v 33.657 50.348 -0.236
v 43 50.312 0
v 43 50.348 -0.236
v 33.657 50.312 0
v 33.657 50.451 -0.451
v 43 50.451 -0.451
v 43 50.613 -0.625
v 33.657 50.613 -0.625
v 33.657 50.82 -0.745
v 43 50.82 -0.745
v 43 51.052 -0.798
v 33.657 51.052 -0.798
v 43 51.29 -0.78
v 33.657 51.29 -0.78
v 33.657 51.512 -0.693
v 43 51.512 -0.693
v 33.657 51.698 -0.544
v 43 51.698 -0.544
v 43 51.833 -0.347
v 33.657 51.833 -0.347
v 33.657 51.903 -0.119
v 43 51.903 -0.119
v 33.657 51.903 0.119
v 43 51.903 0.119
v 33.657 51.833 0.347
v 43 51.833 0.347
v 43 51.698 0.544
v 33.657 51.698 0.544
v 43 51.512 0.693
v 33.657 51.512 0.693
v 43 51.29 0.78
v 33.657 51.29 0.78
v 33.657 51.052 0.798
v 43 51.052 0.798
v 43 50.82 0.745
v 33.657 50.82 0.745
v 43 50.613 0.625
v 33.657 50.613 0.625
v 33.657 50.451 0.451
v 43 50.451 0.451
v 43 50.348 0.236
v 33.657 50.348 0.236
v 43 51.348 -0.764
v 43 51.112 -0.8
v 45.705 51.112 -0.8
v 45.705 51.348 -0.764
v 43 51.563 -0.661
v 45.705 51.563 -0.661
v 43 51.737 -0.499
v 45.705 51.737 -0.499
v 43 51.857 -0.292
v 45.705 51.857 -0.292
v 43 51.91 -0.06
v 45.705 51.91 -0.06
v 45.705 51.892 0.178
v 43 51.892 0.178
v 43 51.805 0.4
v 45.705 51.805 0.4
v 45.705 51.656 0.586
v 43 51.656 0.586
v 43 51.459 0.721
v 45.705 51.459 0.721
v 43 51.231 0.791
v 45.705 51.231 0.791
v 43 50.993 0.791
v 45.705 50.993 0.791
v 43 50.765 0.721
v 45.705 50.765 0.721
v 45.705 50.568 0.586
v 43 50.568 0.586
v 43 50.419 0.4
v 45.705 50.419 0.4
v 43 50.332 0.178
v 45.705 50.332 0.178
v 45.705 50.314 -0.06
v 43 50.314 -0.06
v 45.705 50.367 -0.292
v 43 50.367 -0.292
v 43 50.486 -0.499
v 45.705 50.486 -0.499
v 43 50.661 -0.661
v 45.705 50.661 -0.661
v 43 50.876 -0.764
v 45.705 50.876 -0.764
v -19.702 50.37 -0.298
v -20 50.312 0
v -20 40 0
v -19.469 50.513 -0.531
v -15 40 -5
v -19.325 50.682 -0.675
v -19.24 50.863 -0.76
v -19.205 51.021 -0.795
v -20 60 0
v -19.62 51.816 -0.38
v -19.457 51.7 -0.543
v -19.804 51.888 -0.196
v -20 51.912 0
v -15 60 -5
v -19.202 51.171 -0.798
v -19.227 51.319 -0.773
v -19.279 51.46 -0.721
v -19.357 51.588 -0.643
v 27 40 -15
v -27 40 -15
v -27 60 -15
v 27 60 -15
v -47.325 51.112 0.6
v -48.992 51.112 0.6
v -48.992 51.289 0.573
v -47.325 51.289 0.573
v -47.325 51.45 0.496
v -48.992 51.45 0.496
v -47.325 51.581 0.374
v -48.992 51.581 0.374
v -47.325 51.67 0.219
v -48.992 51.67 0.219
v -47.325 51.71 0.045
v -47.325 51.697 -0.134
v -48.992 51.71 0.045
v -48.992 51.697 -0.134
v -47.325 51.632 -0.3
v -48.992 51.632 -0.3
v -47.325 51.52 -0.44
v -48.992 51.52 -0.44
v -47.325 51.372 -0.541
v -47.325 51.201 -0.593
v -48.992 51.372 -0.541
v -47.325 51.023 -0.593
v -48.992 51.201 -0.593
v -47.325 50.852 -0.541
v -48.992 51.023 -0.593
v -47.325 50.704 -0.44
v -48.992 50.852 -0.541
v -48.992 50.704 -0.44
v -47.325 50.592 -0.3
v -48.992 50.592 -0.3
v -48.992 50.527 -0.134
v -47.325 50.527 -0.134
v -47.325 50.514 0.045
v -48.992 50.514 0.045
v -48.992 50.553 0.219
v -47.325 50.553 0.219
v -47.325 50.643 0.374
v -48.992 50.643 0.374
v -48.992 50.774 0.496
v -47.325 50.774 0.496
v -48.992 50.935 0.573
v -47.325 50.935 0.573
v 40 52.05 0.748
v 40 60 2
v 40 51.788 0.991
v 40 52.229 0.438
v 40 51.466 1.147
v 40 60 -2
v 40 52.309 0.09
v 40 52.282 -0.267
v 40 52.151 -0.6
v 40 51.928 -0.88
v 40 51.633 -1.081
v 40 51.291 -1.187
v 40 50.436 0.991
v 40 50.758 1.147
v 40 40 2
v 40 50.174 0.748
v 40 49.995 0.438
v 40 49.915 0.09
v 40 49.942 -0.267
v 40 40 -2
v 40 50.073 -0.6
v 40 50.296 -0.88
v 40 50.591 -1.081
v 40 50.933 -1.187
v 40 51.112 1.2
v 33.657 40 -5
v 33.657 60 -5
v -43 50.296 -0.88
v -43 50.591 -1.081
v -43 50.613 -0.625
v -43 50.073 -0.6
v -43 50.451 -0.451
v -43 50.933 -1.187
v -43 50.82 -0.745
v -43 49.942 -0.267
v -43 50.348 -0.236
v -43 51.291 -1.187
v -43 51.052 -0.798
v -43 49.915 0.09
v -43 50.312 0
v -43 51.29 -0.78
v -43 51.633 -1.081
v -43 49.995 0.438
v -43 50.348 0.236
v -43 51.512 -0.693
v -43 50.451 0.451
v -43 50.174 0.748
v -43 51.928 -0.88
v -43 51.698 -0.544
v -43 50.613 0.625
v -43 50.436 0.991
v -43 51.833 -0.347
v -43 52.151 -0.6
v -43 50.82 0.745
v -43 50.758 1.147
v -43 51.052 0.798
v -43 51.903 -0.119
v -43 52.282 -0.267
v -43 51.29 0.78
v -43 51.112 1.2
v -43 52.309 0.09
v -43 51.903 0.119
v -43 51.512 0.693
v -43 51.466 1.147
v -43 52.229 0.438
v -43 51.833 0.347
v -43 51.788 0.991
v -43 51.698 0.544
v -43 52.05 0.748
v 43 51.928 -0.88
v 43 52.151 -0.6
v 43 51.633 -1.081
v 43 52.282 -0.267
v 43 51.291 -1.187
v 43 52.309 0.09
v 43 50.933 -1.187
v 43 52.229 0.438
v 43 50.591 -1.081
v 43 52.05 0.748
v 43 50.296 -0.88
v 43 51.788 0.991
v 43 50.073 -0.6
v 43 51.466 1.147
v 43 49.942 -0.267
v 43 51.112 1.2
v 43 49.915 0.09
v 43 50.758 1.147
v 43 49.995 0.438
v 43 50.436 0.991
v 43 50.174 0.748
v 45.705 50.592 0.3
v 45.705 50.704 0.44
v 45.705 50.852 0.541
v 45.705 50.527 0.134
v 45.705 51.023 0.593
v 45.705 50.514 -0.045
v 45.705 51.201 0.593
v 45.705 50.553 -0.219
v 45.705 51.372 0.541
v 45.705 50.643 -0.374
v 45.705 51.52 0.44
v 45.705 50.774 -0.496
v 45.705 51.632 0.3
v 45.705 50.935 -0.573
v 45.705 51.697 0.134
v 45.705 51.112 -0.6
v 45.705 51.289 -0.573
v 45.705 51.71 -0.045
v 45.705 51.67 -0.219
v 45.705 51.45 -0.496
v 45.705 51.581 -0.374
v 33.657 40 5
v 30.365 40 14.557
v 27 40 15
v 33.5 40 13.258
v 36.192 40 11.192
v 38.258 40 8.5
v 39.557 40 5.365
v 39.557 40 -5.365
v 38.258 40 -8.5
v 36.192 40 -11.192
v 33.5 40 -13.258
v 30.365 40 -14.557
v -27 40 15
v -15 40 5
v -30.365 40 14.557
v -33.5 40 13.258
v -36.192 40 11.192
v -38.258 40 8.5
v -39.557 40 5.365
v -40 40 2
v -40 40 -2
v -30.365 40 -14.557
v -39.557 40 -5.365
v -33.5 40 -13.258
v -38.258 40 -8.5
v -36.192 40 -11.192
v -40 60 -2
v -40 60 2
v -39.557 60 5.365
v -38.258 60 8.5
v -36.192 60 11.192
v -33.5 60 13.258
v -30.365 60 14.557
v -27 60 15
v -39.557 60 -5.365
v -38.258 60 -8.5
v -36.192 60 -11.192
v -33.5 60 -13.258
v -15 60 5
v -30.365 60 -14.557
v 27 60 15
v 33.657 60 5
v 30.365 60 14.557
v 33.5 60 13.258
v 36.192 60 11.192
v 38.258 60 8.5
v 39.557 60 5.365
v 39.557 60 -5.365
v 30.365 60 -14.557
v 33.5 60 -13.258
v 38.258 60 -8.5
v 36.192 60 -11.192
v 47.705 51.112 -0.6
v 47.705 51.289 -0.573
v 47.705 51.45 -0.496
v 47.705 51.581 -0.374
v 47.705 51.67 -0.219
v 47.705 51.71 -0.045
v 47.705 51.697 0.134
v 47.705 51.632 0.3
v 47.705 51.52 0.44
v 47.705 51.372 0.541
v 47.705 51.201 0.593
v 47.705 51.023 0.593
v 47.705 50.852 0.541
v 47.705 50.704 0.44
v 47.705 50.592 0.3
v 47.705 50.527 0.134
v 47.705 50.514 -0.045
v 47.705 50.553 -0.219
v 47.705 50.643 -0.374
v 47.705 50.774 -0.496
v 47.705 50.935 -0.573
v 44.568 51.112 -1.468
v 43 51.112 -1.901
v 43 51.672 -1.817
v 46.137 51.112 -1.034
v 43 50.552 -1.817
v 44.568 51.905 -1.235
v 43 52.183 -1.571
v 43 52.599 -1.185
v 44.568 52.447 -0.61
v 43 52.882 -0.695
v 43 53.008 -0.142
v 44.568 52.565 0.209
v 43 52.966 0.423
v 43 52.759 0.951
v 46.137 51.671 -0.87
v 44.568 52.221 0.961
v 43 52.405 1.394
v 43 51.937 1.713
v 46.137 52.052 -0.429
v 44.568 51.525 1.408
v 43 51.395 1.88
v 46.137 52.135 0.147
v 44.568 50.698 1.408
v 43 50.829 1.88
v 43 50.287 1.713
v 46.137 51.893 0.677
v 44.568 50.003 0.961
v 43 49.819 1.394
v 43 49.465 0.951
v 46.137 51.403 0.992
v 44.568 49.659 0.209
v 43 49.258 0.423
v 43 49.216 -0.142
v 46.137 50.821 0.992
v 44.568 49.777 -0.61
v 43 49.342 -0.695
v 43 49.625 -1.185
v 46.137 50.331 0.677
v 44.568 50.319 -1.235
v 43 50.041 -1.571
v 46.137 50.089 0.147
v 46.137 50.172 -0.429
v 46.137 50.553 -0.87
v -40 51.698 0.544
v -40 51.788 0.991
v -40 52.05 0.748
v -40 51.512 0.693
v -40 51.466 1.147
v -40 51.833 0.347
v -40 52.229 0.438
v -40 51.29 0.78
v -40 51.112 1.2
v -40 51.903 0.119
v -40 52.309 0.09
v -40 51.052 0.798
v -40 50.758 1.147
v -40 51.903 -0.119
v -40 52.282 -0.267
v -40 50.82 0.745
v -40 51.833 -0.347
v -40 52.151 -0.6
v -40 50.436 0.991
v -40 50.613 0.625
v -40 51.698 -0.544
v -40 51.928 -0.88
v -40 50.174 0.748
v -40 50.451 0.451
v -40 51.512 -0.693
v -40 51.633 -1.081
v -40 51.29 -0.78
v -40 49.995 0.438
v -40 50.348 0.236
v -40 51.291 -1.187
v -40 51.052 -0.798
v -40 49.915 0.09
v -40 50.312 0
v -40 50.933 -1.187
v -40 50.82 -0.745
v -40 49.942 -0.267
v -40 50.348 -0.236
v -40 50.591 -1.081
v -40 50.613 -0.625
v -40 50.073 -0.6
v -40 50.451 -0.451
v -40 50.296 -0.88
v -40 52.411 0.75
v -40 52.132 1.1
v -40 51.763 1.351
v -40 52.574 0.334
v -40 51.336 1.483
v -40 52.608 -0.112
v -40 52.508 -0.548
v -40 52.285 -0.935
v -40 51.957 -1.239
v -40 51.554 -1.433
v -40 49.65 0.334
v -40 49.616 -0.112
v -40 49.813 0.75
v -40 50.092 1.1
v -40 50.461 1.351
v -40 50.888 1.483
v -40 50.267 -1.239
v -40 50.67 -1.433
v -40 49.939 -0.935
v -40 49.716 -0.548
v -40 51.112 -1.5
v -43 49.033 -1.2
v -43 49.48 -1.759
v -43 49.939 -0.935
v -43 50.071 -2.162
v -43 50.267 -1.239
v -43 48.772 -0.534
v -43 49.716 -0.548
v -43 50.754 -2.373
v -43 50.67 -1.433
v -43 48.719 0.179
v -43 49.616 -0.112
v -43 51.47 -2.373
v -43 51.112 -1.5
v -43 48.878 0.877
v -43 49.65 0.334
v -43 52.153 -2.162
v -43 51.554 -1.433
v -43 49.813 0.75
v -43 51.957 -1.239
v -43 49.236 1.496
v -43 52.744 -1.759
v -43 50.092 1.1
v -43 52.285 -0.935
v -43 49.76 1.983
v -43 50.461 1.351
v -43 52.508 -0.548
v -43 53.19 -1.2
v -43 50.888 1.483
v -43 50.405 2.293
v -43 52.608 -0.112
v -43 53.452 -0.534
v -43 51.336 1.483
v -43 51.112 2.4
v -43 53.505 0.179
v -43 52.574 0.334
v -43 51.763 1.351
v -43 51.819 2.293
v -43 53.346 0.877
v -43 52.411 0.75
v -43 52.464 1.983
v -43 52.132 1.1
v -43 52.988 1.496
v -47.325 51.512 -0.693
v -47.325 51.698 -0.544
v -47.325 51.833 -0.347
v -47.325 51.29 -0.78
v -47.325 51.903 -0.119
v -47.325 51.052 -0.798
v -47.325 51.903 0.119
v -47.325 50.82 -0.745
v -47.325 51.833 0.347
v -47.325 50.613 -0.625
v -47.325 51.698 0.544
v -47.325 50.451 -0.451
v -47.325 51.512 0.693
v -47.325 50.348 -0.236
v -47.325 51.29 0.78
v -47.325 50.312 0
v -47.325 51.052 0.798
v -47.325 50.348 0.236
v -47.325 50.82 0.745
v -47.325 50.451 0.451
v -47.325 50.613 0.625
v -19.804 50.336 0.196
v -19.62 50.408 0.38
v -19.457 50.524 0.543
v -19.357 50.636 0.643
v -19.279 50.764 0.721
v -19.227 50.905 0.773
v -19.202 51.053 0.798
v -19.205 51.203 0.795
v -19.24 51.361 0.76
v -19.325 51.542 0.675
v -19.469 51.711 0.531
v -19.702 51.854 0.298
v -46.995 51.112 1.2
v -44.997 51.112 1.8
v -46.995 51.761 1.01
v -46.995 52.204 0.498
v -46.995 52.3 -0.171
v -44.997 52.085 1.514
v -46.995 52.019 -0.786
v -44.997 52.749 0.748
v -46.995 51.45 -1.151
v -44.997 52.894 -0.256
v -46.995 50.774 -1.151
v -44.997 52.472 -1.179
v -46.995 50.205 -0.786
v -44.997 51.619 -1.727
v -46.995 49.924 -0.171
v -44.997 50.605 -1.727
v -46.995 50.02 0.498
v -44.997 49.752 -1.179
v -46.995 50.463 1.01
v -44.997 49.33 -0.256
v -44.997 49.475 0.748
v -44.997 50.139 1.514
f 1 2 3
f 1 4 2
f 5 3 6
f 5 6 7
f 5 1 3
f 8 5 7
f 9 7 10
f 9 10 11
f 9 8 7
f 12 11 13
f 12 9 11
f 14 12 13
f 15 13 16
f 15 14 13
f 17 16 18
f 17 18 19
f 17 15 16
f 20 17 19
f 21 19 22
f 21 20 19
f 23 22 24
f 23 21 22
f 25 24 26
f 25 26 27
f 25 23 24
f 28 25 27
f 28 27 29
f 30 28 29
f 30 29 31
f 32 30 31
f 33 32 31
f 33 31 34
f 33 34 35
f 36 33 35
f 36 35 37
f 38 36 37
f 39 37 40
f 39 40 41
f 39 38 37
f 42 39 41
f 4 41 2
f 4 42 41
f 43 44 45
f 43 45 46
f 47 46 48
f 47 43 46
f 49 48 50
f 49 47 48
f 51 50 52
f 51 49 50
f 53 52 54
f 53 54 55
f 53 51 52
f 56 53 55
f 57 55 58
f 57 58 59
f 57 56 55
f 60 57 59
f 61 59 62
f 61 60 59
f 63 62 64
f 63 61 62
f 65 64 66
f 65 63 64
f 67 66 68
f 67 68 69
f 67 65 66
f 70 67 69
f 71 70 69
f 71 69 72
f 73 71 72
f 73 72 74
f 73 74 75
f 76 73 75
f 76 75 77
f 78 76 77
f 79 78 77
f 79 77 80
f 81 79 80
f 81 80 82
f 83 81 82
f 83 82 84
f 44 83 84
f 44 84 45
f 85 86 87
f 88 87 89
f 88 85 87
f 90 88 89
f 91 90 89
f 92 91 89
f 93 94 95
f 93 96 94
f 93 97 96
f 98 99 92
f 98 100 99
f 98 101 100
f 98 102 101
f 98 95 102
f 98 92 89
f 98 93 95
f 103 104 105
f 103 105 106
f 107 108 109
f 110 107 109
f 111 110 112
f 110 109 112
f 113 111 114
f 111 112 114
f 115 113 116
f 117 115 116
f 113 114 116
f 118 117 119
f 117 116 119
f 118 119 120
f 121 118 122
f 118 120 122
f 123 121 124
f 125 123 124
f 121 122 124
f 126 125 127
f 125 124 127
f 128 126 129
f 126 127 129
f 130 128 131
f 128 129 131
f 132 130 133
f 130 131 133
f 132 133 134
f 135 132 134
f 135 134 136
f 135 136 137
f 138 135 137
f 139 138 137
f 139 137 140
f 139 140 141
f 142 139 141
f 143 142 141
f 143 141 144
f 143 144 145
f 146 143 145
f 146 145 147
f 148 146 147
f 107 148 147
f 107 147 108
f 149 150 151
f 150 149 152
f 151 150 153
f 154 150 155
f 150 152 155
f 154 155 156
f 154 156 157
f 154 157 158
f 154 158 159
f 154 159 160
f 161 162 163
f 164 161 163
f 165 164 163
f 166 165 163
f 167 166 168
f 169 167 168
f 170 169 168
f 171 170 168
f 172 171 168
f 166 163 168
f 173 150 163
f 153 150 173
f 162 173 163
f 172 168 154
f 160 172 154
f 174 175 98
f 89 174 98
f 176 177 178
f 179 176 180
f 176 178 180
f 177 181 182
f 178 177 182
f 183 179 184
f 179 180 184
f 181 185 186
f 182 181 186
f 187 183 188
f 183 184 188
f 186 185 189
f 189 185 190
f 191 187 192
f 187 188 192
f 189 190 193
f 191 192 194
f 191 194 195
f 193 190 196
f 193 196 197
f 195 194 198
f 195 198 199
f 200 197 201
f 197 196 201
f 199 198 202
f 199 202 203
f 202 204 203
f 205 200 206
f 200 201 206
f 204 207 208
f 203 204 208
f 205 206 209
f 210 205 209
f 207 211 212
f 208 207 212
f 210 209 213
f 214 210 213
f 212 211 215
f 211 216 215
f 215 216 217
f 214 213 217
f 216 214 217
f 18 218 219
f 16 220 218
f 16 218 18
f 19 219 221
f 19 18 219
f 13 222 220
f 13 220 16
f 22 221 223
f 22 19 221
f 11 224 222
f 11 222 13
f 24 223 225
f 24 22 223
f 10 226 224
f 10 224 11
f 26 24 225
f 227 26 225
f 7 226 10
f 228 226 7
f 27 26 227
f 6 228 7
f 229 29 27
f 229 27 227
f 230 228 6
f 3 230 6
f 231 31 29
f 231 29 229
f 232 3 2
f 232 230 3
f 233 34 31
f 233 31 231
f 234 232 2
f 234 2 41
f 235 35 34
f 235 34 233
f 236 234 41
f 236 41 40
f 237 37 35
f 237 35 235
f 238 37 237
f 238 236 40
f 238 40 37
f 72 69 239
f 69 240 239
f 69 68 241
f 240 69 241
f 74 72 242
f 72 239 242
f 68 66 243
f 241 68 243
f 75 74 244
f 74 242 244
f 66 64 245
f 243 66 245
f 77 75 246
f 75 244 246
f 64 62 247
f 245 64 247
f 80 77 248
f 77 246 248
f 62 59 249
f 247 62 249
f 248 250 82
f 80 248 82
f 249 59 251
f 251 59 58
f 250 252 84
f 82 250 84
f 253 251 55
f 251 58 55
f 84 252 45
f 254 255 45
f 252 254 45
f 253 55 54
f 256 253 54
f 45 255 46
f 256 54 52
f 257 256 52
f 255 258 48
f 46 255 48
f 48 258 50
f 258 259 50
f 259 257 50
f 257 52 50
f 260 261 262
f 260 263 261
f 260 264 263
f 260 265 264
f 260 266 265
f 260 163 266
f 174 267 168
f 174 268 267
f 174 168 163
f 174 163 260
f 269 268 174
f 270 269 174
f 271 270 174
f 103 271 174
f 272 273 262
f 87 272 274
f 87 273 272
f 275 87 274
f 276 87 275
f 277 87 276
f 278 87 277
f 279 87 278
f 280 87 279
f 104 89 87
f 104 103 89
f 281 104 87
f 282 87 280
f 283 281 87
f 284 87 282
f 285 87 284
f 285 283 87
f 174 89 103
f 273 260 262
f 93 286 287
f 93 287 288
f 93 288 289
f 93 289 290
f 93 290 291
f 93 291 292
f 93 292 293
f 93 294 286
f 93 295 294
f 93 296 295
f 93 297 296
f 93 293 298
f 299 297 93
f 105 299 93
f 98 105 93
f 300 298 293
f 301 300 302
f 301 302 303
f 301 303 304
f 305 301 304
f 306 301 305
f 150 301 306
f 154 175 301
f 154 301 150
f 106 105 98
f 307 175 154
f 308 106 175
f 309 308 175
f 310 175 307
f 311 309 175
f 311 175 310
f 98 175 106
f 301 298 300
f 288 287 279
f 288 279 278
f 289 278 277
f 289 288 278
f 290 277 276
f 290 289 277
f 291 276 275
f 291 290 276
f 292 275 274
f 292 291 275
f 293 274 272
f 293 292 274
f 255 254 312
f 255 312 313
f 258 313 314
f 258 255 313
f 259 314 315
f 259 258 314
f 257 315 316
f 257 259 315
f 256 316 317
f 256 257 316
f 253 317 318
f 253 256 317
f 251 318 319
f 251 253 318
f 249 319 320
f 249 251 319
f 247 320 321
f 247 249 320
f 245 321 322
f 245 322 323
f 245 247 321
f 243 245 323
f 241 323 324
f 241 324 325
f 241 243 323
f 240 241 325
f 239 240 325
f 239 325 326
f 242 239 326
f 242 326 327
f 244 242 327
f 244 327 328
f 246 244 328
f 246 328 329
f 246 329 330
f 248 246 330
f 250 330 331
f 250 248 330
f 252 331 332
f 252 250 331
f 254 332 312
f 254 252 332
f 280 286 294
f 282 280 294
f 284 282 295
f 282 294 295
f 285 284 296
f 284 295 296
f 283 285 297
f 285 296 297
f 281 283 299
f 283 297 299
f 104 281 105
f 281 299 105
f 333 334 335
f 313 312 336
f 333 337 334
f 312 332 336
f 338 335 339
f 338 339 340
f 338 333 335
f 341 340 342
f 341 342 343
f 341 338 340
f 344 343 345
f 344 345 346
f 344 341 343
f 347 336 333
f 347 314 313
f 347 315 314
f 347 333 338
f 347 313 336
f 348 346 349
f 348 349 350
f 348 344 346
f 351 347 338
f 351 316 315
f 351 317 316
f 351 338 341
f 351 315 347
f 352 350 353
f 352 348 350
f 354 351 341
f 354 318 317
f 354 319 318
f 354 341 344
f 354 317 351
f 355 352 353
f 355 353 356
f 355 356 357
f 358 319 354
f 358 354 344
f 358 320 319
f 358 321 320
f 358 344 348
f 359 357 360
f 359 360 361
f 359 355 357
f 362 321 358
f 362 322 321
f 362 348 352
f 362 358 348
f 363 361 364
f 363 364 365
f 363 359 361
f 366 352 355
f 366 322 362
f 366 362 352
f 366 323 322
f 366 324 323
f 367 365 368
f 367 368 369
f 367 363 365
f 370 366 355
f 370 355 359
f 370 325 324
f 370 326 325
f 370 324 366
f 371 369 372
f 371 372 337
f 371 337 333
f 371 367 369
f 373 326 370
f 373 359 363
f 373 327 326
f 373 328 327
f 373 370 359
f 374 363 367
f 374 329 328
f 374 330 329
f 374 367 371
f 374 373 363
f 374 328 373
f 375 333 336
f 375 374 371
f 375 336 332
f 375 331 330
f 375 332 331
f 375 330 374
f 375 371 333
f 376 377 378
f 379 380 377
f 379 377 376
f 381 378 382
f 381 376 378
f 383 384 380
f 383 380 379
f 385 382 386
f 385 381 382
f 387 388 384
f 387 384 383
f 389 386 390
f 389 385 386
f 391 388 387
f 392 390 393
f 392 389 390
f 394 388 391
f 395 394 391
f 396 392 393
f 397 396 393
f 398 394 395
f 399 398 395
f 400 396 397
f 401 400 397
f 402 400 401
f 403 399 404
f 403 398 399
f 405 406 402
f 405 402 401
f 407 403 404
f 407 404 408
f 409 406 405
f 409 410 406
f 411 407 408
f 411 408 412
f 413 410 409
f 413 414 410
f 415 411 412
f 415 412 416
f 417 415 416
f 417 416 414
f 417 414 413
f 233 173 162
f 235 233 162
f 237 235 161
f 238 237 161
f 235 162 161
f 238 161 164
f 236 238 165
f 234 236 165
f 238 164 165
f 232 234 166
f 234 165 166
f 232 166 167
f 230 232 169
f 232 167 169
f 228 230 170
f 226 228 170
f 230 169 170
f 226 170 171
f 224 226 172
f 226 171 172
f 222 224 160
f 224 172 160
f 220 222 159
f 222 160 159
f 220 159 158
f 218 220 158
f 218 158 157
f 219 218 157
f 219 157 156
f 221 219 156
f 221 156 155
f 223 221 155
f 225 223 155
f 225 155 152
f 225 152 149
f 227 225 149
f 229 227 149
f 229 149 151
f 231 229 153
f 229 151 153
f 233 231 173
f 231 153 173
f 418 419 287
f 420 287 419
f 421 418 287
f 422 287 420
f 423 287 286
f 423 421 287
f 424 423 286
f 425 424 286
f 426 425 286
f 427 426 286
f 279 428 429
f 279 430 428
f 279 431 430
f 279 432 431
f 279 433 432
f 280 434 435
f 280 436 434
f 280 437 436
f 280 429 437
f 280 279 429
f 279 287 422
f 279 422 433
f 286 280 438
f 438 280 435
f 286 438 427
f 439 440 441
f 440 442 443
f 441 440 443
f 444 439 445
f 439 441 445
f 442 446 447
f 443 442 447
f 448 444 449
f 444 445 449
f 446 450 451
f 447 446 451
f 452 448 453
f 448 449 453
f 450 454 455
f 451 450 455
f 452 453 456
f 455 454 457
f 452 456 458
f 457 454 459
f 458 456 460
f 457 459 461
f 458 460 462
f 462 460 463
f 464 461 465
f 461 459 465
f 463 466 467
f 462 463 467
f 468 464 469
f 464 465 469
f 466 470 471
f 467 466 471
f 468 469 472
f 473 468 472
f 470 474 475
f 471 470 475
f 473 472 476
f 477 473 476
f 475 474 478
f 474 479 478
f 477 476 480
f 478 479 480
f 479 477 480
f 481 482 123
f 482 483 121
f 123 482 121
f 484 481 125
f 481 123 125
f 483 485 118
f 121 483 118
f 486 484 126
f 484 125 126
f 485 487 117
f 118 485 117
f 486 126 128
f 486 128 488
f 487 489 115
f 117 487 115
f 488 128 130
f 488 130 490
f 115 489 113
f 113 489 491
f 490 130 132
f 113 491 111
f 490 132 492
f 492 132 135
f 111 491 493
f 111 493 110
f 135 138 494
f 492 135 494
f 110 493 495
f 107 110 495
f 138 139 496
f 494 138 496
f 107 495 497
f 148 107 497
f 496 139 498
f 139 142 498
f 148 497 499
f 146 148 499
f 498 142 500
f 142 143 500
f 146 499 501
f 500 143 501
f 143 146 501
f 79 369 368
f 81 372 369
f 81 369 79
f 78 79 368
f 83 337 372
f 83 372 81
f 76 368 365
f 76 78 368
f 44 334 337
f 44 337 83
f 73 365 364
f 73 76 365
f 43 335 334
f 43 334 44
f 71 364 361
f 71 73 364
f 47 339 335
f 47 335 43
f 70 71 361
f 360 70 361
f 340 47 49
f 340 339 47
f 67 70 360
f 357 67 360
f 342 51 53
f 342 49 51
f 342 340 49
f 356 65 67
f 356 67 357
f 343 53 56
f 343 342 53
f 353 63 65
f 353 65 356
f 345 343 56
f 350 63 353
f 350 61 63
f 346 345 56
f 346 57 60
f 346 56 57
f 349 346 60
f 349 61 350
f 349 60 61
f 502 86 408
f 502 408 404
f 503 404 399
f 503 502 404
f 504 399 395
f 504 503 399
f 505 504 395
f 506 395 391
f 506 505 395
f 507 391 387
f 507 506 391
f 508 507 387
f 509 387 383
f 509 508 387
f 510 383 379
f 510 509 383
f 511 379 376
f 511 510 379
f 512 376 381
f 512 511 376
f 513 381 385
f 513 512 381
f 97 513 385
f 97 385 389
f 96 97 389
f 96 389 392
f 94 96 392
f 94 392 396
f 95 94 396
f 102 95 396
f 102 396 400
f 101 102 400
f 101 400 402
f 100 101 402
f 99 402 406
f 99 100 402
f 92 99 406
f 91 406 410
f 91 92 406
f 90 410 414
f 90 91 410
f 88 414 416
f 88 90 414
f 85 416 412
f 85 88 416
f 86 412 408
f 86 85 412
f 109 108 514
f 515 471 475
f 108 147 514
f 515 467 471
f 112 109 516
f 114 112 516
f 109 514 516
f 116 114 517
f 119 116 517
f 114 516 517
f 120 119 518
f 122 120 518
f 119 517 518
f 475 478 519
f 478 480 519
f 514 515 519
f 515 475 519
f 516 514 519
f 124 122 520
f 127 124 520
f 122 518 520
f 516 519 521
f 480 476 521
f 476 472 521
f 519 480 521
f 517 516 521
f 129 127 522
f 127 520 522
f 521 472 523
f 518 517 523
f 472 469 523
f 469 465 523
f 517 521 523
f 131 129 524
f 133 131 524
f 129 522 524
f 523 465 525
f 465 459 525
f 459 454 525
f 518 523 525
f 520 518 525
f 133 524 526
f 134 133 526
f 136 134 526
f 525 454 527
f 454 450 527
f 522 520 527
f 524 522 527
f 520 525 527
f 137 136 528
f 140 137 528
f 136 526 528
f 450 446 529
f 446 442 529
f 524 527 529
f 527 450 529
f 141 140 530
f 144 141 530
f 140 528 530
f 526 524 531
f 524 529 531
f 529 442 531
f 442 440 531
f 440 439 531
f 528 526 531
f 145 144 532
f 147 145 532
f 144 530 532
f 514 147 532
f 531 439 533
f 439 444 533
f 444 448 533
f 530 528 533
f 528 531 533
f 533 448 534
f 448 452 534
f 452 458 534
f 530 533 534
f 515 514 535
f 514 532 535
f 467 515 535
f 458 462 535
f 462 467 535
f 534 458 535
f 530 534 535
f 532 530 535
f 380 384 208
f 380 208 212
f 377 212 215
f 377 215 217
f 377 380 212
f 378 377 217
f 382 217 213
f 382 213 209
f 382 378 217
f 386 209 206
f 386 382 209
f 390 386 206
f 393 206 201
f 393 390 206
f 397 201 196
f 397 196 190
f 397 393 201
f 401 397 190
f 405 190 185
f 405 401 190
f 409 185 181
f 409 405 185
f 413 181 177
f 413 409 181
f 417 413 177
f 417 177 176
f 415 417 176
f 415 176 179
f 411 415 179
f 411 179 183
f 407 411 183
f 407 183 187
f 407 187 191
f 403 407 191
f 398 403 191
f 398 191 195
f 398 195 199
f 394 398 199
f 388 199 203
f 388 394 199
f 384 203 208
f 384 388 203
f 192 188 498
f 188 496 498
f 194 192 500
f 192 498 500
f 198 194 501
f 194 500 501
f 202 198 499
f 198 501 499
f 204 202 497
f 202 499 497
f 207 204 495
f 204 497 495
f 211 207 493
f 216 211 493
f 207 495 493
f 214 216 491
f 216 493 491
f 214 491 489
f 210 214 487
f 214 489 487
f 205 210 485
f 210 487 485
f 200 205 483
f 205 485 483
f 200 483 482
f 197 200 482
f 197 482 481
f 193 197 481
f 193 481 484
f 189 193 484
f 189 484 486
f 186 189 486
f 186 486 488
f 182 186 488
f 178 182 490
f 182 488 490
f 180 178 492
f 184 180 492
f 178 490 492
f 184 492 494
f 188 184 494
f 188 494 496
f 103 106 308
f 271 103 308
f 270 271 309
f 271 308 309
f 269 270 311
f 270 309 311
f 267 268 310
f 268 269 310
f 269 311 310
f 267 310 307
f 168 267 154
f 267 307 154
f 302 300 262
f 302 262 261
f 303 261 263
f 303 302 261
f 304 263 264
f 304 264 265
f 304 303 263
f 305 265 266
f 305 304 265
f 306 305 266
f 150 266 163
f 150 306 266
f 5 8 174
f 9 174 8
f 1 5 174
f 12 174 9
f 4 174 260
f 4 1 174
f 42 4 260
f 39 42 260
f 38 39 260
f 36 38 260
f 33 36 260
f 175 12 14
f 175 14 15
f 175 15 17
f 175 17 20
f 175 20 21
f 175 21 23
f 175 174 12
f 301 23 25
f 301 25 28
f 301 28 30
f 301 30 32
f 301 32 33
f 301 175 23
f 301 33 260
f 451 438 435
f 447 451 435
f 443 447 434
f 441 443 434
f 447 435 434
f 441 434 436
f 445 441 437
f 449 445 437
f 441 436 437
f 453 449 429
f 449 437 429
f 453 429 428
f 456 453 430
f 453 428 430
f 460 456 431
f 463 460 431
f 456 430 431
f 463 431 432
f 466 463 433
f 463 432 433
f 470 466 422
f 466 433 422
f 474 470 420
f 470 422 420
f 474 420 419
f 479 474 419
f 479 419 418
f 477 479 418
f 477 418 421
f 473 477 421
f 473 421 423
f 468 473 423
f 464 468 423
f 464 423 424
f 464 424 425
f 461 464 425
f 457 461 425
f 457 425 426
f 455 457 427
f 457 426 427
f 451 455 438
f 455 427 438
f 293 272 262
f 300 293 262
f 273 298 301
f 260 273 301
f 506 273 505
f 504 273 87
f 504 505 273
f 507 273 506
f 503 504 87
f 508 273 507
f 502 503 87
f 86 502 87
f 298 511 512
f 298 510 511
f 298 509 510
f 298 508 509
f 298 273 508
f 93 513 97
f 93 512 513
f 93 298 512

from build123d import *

# Parameters (mm, degrees)
SKETCH1_W               = 80
SKETCH1_H               = 30
BOSS_EXTRUDE1_DEPTH     = 60
CUT_EXTRUDE1_DEPTH      = 75
CUT_EXTRUDE2_DEPTH      = 102.118742081
CUT_EXTRUDE2_DEPTH_BACK = 102.118742081
SKETCH3_R               = 0.8
SKETCH4_R               = 1.5
SKETCH4_R_2             = 1.2
BOSS_EXTRUDE2_DEPTH     = 3
SKETCH7_R               = 0.6
CUT_EXTRUDE3_DEPTH      = 2
SKETCH8_R               = 0.8
CUT_EXTRUDE4_DEPTH      = 53
FILLET1_R               = 13
SKETCH9_R               = 1.2
SKETCH9_R_2             = 0.8
BOSS_EXTRUDE3_DEPTH     = 3
CUT_EXTRUDE5_START      = -2
SKETCH12_R              = 0.6
CUT_EXTRUDE5_DEPTH      = 2
CUT_EXTRUDE6_START      = -35
SKETCH14_R              = 0.8
CUT_EXTRUDE6_DEPTH      = 35
SKETCH15_W              = 83.696095513
SKETCH15_H              = 31.69844841
CUT_EXTRUDE7_DEPTH      = 50


with BuildPart() as part:
    # Sketch1 → Boss-Extrude1 (new body)
    with BuildSketch(Plane(origin=(0, 0, 0), x_dir=(1, 0, 0), z_dir=(0, 1, 0))):
        Rectangle(SKETCH1_W, SKETCH1_H)
    extrude(amount=BOSS_EXTRUDE1_DEPTH)

    # Sketch2 → Cut-Extrude1 (cut)
    with BuildSketch(Plane(origin=(0, 60, 0), x_dir=(1, 0, 0), z_dir=(0, 1, 0))):
        Polygon((-15, 5), (15, 5), (33.657016573, 5), (33.657016573, -5), (15, -5), (-15, -5), (-20, 0), align=None)
    extrude(amount=-CUT_EXTRUDE1_DEPTH, mode=Mode.SUBTRACT)

    # Sketch3 → Cut-Extrude2 (cut, two sides: drawn at the far end of the back side and taken through both)
    with BuildSketch(Plane.ZY.offset(40).offset(-CUT_EXTRUDE2_DEPTH_BACK)):
        with Locations(Location((0, 51.111959895, 0), (0, 0, 270))):
            Circle(SKETCH3_R)
    extrude(amount=CUT_EXTRUDE2_DEPTH + CUT_EXTRUDE2_DEPTH_BACK, mode=Mode.SUBTRACT)

    # Sketch4 → Boss-Extrude2 (add)
    with BuildSketch(Plane.ZY.offset(40)):
        with Locations(Location((0, 51.111959895, 0), (0, 0, 180))):
            Circle(SKETCH4_R)
        with Locations((0, 51.111959895)):
            Circle(SKETCH4_R_2, mode=Mode.SUBTRACT)
    extrude(amount=BOSS_EXTRUDE2_DEPTH)

    # Sketch6 → Revolve1 (revolve)
    with BuildSketch(Plane.XY, mode=Mode.PRIVATE) as revolve1_sk:
        Polygon((-43, 51.111959895), (-49.325220868, 51.111959895), (-49.325220868, 51.611959895), (-43, 53.511959895), align=None)
    revolve(revolve1_sk.sketch.rotate(Axis((-43, 51.111959895, 0), (-1, 0, 0)), 270), axis=Axis((-43, 51.111959895, 0), (-1, 0, 0)))

    # Sketch7 → Cut-Extrude3 (cut)
    with BuildSketch(Plane.ZY.offset(49.325220868)):
        with Locations((0, 51.111959895)):
            Circle(SKETCH7_R)
    extrude(amount=-CUT_EXTRUDE3_DEPTH, mode=Mode.SUBTRACT)

    # Sketch8 → Cut-Extrude4 (cut)
    with BuildSketch(Plane.ZY.offset(47.325220868)):
        with Locations(Location((0, 51.111959895, 0), (0, 0, 270))):
            Circle(SKETCH8_R)
    extrude(amount=-CUT_EXTRUDE4_DEPTH, mode=Mode.SUBTRACT)

    # Fillet1
    fillet1_edges = [part.edges().sort_by_distance(p)[0] for p in [
        (40, 30, 15),
        (-40, 30, 15),
        (-40, 30, -15),
        (40, 30, -15),
    ]]
    fillet(fillet1_edges, radius=FILLET1_R)

    # Sketch9 → Boss-Extrude3 (add)
    with BuildSketch(Plane(origin=(40, 0, 0), x_dir=(0, 0, -1), z_dir=(1, 0, 0))):
        with Locations(Location((0, 51.111959895, 0), (0, 0, 180))):
            Circle(SKETCH9_R)
        with Locations(Location((0, 51.111959895, 0), (0, 0, 270))):
            Circle(SKETCH9_R_2, mode=Mode.SUBTRACT)
    extrude(amount=BOSS_EXTRUDE3_DEPTH)

    # Sketch15 → Cut-Extrude7 (cut)
    with BuildSketch(Plane(origin=(0, -10, 0), x_dir=(-1, 0, 0), z_dir=(0, -1, 0))):
        with Locations((-0.057440767, 0.030479277)):
            Rectangle(SKETCH15_W, SKETCH15_H)
    extrude(amount=-CUT_EXTRUDE7_DEPTH, mode=Mode.SUBTRACT)


with BuildPart() as body_2:
    # Sketch11 → Revolve2 (revolve)
    with BuildSketch(Plane.XY, mode=Mode.PRIVATE) as revolve2_sk:
        Polygon((43, 51.111959895), (43, 53.013316413), (47.705149283, 51.711959895), (47.705149283, 51.111959895), align=None)
    revolve(revolve2_sk.sketch.rotate(Axis((43, 51.111959895, 0), (1, 0, 0)), 270), axis=Axis((43, 51.111959895, 0), (1, 0, 0)))

    # Sketch12 → Cut-Extrude5 (cut)
    with BuildSketch(Plane(origin=(47.705149283, 0, 0), x_dir=(0, 0, -1), z_dir=(1, 0, 0)).offset(CUT_EXTRUDE5_START)):
        with Locations((0, 51.111959895)):
            Circle(SKETCH12_R)
    extrude(amount=CUT_EXTRUDE5_DEPTH, mode=Mode.SUBTRACT)

    # Sketch14 → Cut-Extrude6 (cut)
    with BuildSketch(Plane(origin=(45.705149283, 0, 0), x_dir=(0, 0, -1), z_dir=(1, 0, 0)).offset(CUT_EXTRUDE6_START)):
        with Locations((0, 51.111959895)):
            Circle(SKETCH14_R)
    extrude(amount=CUT_EXTRUDE6_DEPTH, mode=Mode.SUBTRACT)


solid = Compound([part.part, body_2.part])
